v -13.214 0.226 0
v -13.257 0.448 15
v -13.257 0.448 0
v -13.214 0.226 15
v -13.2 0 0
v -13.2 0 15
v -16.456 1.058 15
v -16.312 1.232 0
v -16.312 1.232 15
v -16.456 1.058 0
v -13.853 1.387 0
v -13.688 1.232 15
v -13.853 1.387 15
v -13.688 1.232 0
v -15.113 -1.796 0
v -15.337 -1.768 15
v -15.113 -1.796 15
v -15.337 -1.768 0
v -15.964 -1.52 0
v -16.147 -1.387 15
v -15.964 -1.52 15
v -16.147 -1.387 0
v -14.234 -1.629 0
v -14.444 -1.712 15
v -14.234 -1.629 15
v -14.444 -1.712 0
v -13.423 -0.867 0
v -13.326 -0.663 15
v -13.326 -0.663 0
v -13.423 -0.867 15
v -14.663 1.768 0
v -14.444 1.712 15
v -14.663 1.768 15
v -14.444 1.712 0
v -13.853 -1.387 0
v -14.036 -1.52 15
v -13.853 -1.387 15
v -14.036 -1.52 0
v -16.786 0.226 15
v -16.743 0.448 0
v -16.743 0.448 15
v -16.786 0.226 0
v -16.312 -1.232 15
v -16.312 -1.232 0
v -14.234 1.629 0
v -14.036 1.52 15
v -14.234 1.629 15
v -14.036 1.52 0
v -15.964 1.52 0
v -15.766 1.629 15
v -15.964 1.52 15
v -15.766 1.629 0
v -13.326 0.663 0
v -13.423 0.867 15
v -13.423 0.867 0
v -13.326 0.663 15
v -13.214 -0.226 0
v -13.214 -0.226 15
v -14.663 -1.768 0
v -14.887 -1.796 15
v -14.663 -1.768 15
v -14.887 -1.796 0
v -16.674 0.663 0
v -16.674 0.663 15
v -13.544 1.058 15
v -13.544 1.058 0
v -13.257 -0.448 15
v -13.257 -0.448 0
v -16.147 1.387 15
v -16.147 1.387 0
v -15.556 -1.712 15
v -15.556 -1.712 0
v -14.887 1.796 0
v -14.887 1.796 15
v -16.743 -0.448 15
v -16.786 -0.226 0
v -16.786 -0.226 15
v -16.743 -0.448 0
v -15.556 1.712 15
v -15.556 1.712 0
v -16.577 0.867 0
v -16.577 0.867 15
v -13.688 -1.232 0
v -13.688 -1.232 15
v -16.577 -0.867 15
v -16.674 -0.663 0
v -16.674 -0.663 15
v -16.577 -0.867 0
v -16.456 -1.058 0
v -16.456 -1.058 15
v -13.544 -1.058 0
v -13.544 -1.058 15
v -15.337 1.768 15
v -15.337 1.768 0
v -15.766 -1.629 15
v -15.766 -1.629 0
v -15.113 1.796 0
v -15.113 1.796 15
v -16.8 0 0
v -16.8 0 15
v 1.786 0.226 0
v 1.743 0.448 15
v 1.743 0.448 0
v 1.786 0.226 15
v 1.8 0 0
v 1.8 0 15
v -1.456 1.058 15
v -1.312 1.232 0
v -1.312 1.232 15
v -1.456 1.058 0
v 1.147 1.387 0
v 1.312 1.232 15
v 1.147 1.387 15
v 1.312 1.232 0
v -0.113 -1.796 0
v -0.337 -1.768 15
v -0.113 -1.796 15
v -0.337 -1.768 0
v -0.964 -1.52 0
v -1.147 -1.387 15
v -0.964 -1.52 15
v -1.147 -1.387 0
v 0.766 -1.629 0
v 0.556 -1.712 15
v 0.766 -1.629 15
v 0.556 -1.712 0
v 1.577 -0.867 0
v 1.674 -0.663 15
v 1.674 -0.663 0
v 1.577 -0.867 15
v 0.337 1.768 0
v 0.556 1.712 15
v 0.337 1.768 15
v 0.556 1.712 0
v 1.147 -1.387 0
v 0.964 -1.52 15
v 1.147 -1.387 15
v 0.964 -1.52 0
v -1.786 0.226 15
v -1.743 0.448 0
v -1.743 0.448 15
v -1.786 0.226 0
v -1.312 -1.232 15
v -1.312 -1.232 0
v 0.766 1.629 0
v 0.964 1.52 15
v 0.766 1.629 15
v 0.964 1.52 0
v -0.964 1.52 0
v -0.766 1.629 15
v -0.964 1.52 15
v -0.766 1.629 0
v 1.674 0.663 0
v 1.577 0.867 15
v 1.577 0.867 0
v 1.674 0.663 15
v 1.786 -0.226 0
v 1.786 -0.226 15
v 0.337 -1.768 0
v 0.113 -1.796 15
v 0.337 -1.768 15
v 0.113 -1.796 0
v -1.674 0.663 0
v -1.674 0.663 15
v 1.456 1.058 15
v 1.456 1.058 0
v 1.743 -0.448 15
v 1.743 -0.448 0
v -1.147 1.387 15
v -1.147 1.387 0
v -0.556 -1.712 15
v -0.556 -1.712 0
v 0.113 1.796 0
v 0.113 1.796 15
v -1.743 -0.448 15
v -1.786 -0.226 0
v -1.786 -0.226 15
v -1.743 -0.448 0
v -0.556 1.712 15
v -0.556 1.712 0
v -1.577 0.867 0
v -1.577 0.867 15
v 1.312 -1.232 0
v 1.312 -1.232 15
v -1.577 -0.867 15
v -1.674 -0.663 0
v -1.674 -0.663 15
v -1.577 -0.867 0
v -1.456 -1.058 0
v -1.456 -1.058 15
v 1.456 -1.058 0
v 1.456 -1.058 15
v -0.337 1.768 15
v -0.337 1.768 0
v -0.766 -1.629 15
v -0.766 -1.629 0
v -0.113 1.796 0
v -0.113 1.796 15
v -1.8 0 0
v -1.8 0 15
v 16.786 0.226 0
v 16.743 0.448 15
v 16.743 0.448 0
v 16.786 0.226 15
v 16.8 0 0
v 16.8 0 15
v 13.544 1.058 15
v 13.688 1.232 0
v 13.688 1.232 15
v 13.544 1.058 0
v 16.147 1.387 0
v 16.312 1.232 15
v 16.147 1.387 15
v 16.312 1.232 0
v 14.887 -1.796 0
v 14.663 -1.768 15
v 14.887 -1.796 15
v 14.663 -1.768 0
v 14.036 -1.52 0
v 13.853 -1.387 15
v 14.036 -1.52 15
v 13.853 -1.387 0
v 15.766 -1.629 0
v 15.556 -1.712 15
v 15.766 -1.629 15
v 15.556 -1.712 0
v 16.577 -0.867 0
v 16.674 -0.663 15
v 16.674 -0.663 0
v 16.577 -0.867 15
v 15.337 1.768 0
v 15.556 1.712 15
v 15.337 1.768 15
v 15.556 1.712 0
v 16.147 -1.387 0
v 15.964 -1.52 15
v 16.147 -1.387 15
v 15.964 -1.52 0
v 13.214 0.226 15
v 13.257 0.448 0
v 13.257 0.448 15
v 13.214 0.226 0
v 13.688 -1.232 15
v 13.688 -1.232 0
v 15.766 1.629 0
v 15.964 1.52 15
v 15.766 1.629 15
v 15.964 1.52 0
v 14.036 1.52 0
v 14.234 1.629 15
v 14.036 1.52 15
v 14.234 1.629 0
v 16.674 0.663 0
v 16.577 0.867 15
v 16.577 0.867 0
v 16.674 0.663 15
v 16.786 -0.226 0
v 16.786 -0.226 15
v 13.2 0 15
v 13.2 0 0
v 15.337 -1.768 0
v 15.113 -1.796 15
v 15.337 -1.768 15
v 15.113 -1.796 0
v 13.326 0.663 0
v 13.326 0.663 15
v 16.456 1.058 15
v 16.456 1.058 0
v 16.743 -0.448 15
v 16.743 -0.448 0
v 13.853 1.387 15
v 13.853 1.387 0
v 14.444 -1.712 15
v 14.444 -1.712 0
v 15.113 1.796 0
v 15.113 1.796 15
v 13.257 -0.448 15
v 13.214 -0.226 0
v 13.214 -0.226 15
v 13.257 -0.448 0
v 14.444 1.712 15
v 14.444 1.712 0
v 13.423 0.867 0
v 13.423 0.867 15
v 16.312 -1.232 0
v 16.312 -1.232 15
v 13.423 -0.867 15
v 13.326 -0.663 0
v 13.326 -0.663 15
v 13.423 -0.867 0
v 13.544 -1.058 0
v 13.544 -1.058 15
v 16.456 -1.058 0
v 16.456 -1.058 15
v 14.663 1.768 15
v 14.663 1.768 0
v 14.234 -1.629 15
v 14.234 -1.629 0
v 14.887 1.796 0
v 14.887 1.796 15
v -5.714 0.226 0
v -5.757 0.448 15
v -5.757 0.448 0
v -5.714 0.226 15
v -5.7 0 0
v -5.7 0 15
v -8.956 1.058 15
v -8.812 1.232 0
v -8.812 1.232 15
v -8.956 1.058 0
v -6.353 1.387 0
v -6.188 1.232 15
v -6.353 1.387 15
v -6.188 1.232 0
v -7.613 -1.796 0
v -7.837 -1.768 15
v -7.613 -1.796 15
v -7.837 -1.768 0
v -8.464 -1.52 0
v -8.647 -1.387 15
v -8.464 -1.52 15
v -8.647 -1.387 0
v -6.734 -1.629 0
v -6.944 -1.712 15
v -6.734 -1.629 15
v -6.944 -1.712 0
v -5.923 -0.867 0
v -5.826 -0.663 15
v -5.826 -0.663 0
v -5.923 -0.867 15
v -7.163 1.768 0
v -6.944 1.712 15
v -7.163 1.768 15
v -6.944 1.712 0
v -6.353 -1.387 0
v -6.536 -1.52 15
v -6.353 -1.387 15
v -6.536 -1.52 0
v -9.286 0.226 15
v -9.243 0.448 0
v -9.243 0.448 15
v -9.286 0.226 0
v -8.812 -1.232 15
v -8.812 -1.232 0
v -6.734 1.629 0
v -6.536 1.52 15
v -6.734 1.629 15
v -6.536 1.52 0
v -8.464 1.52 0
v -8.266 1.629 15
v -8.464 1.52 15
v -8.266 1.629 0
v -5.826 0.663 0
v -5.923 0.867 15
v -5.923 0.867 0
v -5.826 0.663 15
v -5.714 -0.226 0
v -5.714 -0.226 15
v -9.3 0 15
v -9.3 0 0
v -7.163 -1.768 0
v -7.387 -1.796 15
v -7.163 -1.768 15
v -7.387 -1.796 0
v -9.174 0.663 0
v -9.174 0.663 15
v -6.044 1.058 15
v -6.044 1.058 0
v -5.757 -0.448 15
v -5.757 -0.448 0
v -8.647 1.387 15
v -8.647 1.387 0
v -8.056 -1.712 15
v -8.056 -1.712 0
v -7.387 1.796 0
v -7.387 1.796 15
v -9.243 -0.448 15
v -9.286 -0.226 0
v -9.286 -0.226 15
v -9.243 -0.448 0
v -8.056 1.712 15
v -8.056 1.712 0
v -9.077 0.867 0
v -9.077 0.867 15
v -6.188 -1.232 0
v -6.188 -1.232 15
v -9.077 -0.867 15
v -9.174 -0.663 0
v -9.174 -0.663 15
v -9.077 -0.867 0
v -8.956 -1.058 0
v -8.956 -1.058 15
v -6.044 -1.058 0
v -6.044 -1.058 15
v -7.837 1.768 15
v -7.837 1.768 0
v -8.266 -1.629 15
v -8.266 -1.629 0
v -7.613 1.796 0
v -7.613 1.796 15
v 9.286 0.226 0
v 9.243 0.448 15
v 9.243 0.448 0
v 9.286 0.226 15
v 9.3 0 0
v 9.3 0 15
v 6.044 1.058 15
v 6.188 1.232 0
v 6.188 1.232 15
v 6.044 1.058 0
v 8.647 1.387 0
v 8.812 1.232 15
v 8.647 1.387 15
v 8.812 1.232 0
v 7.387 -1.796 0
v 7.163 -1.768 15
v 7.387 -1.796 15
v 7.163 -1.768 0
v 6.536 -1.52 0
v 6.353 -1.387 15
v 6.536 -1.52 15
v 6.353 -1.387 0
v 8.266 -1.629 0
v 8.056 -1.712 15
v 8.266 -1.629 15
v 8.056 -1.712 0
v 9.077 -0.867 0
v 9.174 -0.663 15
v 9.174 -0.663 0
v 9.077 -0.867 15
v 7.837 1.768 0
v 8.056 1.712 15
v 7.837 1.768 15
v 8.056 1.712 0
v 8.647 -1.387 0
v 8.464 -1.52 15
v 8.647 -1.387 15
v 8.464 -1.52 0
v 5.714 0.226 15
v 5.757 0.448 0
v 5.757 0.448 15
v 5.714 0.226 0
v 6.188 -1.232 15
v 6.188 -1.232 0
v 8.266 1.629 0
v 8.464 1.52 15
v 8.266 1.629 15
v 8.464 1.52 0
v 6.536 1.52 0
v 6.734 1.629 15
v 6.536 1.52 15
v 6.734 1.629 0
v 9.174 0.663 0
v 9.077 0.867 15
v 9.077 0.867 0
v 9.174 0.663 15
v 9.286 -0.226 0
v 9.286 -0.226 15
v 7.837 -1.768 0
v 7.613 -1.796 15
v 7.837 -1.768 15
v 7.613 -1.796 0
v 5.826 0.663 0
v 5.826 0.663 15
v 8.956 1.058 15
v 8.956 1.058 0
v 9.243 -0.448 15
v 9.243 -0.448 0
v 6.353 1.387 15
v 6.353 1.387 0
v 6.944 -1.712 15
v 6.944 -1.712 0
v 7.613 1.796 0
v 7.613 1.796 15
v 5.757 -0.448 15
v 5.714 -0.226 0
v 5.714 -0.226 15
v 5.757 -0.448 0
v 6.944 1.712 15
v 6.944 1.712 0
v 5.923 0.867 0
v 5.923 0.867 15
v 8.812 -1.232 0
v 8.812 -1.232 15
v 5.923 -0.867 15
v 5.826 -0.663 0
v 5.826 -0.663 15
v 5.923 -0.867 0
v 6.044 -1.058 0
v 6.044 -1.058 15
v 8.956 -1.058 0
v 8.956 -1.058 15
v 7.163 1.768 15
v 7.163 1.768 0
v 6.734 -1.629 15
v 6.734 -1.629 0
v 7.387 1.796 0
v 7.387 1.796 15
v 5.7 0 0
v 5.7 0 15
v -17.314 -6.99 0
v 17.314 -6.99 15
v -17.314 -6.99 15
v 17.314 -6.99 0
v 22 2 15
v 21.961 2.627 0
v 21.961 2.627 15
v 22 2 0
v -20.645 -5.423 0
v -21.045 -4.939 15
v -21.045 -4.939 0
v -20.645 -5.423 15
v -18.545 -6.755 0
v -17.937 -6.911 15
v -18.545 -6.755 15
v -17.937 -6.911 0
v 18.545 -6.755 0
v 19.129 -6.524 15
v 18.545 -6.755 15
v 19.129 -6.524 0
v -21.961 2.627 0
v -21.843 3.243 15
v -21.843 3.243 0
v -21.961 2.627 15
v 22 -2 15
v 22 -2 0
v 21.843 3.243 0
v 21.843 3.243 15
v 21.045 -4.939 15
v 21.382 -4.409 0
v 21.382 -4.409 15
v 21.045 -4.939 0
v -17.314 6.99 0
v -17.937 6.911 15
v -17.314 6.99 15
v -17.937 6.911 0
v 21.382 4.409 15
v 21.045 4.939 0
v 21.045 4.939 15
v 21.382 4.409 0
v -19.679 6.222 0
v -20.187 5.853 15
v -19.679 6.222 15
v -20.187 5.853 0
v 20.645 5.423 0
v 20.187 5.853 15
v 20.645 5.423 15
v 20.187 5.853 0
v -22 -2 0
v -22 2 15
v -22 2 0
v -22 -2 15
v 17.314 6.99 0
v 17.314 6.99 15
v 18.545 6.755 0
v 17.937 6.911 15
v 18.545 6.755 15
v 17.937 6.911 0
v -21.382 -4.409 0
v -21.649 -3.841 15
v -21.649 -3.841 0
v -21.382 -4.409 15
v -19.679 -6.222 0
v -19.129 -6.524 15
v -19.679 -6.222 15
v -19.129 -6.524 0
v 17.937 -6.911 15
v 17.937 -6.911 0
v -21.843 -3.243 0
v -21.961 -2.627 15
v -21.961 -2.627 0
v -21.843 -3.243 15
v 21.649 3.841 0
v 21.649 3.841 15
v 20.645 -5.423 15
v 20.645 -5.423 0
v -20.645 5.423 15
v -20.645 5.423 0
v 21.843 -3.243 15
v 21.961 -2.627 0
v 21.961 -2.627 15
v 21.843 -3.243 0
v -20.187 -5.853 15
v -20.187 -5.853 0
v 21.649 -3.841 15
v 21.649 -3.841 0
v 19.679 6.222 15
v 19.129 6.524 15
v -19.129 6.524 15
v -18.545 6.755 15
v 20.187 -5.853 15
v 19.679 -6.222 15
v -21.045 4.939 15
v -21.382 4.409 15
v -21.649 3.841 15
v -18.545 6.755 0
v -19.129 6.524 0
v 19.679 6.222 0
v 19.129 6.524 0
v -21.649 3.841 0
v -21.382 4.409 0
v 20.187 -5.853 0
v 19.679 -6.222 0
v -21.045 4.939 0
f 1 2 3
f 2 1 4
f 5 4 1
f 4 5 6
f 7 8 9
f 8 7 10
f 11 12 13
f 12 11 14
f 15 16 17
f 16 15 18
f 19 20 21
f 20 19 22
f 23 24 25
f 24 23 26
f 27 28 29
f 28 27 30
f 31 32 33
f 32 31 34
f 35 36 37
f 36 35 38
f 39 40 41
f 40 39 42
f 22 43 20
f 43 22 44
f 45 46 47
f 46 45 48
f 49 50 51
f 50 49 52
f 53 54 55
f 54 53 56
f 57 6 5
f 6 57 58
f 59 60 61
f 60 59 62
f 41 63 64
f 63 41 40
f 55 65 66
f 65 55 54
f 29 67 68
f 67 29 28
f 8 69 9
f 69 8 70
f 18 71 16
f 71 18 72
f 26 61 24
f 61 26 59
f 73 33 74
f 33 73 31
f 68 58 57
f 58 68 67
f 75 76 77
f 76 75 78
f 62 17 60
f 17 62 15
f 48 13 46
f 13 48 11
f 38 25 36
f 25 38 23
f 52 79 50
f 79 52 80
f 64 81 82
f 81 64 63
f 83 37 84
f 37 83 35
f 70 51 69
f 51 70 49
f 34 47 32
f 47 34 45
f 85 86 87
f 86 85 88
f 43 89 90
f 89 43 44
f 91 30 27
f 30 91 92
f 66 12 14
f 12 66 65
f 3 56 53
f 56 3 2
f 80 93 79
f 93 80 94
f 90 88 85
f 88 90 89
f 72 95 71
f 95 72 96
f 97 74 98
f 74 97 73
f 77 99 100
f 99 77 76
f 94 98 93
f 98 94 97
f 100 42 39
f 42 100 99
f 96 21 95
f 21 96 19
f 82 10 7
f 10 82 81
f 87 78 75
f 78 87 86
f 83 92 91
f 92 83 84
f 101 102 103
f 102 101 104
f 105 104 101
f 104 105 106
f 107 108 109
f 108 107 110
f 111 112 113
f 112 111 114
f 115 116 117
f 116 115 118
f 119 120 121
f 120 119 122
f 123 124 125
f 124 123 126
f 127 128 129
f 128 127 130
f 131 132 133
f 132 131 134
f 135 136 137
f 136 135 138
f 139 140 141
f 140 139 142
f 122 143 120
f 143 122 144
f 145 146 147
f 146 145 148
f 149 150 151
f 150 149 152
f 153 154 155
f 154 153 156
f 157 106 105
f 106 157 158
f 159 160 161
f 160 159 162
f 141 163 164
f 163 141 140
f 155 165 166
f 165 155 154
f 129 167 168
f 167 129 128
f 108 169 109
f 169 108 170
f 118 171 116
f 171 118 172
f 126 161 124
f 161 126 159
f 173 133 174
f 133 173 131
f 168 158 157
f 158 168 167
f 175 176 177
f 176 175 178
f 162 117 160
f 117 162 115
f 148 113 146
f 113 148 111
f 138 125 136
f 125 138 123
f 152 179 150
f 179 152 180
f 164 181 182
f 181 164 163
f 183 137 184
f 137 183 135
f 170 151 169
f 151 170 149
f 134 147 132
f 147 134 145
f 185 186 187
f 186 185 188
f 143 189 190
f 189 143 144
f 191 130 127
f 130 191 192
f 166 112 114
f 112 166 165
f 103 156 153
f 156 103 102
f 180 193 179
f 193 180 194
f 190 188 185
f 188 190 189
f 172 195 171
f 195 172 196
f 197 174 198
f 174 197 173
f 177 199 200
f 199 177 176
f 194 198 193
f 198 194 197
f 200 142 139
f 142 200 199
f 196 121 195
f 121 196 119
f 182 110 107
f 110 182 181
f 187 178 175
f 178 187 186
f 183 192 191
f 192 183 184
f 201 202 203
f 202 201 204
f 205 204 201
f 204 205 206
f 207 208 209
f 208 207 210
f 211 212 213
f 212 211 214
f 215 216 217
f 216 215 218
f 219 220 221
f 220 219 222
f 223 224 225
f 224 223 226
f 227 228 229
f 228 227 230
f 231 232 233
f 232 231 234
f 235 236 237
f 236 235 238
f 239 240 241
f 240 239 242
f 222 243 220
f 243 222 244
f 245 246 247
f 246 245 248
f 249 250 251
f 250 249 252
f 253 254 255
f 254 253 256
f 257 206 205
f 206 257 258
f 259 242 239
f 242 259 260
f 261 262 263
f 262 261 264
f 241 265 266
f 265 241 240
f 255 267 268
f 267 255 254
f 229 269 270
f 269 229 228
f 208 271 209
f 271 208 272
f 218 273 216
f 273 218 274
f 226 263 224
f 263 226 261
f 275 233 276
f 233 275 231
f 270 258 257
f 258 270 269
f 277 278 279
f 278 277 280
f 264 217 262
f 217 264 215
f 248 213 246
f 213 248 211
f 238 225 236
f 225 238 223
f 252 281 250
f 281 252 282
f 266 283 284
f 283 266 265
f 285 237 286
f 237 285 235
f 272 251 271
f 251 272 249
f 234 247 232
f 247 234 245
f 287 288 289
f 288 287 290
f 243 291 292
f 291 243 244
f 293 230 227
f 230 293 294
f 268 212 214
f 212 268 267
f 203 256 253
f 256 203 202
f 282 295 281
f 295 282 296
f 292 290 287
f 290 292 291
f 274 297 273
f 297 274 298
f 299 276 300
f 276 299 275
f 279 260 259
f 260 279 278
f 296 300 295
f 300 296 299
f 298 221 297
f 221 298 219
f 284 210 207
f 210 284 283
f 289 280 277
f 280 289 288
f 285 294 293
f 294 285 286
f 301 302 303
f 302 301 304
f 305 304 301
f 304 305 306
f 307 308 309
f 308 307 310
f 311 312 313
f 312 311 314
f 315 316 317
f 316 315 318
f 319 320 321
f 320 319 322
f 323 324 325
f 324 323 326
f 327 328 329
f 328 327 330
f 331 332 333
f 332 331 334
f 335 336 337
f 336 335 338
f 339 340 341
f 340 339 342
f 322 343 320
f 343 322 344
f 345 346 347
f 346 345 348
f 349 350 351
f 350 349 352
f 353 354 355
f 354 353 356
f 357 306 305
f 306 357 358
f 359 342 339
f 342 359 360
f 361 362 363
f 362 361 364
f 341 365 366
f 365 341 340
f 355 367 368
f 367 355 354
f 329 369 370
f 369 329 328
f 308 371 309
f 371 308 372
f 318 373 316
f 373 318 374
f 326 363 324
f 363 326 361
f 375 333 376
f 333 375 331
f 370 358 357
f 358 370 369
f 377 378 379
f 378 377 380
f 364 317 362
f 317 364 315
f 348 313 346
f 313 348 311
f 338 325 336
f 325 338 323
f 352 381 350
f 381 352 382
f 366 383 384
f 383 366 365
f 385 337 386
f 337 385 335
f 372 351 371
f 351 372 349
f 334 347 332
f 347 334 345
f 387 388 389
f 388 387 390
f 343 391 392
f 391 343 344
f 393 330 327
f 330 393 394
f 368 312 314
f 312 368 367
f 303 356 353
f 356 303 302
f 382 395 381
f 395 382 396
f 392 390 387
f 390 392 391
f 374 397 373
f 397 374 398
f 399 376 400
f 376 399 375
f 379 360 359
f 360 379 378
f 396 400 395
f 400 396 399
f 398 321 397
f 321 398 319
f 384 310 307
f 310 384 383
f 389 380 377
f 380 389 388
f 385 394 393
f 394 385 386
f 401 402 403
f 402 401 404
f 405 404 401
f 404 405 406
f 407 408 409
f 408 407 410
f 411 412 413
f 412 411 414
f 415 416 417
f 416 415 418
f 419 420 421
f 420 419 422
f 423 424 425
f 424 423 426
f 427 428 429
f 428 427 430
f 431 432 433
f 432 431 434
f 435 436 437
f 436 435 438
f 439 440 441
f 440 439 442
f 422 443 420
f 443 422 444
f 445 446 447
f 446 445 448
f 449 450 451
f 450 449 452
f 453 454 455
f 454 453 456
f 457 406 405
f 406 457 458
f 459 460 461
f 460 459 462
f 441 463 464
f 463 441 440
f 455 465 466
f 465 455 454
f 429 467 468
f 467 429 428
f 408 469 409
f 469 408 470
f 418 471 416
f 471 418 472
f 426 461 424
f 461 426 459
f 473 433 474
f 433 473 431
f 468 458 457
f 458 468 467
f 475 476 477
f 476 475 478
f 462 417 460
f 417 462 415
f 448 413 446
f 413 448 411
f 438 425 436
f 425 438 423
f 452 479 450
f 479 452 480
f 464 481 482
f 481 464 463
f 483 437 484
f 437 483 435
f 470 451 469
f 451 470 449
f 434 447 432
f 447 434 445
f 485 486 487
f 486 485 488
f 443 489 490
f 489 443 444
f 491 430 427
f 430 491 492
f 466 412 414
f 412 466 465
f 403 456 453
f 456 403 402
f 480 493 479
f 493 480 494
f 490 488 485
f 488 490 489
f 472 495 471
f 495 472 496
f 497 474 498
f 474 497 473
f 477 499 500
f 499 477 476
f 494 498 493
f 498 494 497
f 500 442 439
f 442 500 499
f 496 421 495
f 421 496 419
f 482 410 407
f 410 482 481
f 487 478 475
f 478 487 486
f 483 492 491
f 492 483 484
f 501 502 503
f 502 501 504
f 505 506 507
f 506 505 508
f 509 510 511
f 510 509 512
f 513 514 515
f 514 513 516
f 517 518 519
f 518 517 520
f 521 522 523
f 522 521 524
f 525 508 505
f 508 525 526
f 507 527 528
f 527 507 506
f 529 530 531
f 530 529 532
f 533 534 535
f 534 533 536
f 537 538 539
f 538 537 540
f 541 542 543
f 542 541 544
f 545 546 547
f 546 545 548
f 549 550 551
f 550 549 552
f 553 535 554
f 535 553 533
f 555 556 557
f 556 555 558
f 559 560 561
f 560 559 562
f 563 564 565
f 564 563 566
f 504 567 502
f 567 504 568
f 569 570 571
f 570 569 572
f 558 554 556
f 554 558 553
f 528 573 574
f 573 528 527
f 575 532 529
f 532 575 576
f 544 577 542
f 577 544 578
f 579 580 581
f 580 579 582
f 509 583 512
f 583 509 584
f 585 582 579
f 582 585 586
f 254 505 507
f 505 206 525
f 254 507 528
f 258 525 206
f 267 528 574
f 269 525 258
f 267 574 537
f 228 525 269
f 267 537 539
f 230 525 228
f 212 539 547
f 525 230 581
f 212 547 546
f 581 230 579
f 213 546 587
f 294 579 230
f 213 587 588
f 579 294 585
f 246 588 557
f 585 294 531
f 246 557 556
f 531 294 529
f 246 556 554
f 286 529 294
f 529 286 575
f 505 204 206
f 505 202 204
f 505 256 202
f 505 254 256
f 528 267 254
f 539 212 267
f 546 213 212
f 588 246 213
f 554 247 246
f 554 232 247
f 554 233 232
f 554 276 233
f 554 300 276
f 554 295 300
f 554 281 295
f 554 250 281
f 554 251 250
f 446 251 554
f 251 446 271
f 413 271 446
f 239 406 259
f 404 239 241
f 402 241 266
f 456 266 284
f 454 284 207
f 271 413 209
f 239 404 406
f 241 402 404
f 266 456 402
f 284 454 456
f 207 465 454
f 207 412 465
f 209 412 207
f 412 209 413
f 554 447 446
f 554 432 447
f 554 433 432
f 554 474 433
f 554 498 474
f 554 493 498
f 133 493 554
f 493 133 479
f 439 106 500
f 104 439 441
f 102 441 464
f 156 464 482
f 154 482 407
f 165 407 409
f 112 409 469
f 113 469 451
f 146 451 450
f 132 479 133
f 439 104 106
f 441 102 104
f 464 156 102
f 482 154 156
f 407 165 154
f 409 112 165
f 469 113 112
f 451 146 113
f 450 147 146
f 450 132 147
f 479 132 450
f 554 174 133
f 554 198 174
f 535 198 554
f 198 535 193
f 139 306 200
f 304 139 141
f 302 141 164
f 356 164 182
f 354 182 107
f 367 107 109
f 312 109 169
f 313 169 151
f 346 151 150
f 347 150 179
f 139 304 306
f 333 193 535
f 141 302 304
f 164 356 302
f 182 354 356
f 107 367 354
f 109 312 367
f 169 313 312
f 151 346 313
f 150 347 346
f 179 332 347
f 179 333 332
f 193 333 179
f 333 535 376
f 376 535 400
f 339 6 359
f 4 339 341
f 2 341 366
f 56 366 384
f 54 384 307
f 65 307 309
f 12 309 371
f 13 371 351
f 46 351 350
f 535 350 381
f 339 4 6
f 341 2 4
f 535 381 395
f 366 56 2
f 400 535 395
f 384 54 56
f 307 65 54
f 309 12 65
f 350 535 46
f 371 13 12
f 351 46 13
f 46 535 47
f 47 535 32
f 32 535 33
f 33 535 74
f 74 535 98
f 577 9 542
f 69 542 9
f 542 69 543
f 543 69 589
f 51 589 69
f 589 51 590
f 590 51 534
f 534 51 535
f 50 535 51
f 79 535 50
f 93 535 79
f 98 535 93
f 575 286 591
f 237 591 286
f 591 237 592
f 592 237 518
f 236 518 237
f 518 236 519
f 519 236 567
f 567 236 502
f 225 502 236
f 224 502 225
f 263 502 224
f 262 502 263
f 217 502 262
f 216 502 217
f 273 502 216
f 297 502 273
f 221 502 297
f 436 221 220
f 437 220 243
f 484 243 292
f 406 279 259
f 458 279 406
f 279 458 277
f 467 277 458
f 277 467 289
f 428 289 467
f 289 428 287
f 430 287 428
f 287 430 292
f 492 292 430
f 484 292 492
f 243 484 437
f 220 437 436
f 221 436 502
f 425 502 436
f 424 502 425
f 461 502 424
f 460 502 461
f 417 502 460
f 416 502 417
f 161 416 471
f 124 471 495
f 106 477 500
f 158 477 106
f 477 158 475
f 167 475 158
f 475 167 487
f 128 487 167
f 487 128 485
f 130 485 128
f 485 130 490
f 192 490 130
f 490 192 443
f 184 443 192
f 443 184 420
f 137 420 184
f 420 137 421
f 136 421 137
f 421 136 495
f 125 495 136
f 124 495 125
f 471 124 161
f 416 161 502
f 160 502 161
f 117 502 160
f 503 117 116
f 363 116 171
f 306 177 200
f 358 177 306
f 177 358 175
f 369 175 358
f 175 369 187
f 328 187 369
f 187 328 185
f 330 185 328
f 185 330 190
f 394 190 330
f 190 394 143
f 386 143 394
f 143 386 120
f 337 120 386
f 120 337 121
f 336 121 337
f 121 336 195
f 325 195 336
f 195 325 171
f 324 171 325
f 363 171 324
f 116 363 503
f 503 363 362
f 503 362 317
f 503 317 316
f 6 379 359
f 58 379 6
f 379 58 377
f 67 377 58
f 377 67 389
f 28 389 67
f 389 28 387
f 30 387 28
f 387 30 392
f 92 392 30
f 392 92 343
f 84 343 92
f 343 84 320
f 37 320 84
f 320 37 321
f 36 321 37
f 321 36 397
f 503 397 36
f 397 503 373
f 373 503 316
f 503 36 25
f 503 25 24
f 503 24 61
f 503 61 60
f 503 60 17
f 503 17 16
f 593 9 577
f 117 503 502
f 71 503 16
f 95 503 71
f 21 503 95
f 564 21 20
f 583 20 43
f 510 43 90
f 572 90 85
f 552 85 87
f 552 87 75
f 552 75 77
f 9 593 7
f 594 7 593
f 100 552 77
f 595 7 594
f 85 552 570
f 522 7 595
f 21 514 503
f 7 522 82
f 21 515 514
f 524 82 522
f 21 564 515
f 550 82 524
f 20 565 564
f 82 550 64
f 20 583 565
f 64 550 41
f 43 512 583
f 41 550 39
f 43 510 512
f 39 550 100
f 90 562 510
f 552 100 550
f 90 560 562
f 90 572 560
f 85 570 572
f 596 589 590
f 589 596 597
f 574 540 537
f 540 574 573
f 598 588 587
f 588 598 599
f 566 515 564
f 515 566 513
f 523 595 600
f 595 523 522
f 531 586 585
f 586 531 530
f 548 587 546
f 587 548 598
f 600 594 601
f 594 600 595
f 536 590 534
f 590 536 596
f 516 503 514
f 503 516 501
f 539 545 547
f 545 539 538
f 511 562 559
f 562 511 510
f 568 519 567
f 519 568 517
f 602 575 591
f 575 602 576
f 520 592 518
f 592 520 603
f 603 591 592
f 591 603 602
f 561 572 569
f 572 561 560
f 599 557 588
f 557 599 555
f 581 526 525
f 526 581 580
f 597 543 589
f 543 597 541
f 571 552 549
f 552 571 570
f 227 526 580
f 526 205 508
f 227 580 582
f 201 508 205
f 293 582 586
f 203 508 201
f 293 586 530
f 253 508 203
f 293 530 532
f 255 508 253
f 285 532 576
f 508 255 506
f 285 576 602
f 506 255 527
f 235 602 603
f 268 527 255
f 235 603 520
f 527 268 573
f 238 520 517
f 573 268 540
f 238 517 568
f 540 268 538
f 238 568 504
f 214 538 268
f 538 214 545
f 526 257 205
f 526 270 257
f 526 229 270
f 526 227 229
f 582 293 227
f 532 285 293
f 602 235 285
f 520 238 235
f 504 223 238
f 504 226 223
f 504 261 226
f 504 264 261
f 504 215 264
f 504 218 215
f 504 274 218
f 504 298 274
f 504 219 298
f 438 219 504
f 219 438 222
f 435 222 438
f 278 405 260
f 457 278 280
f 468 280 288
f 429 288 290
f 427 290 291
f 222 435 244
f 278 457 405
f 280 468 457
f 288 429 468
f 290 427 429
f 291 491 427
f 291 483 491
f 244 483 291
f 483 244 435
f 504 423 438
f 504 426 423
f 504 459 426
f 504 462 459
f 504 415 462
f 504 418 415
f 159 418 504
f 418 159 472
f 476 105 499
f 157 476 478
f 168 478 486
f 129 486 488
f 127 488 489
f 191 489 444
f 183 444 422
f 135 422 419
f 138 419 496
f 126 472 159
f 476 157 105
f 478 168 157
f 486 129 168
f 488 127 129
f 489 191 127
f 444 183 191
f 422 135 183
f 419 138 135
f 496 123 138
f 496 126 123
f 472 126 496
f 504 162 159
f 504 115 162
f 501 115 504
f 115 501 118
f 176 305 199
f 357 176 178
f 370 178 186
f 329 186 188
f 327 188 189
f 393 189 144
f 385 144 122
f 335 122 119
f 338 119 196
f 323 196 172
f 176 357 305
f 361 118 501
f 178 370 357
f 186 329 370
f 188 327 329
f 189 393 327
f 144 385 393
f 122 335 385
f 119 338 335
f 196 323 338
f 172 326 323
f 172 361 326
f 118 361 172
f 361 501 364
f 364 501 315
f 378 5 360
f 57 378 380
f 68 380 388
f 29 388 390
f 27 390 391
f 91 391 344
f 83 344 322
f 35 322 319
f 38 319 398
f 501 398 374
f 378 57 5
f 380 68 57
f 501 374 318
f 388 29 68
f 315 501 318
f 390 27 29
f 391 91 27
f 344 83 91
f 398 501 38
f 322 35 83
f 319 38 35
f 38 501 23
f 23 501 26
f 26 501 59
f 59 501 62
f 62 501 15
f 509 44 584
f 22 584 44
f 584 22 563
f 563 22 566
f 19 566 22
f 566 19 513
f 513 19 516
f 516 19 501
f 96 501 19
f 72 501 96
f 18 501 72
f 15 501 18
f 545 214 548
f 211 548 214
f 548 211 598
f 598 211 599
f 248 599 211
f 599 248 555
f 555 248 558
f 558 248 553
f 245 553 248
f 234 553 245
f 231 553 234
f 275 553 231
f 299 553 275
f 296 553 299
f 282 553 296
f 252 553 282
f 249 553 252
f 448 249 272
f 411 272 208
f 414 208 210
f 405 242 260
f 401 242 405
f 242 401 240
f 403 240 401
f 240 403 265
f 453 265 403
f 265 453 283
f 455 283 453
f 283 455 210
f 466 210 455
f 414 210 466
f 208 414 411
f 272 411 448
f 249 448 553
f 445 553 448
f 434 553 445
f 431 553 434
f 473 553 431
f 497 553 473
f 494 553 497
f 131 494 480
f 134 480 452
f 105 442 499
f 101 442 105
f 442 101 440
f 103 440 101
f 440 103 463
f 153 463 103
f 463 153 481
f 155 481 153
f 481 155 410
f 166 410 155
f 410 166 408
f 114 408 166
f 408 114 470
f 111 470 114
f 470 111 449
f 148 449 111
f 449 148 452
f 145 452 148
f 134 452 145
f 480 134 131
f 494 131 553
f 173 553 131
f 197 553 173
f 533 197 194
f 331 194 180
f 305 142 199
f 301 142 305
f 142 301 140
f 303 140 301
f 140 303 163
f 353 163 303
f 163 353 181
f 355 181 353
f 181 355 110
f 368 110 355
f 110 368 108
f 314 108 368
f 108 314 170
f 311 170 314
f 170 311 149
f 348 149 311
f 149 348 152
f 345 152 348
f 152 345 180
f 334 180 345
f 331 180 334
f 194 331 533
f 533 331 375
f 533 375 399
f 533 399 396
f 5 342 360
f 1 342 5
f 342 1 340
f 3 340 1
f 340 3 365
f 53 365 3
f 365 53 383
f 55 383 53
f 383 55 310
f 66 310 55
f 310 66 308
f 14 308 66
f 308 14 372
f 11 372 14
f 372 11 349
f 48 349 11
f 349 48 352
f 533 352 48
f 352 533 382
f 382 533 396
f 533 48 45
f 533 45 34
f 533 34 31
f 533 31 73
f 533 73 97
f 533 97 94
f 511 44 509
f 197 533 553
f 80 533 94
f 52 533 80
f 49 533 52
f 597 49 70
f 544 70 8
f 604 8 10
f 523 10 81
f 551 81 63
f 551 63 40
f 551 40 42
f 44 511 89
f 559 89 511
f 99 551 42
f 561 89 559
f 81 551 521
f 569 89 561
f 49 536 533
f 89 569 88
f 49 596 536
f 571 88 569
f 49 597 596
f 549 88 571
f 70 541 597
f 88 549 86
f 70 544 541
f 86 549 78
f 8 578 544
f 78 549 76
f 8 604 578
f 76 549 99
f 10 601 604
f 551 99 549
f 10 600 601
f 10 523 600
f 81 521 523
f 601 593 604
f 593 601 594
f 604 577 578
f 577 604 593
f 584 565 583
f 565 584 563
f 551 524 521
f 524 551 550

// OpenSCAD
$fn = 50;


difference() {
	union() {
		hull() {
			translate(v = [-17.0000000000, 2.0000000000, 0]) {
				cylinder(h = 15, r = 5);
			}
			translate(v = [17.0000000000, 2.0000000000, 0]) {
				cylinder(h = 15, r = 5);
			}
			translate(v = [-17.0000000000, -2.0000000000, 0]) {
				cylinder(h = 15, r = 5);
			}
			translate(v = [17.0000000000, -2.0000000000, 0]) {
				cylinder(h = 15, r = 5);
			}
		}
	}
	union() {
		translate(v = [-15.0000000000, 0.0000000000, 0]) {
			translate(v = [0, 0, -100]) {
				cylinder(h = 200, r = 1.8000000000);
			}
		}
		translate(v = [0, 0, -100]) {
			cylinder(h = 200, r = 1.8000000000);
		}
		translate(v = [15.0000000000, 0.0000000000, 0]) {
			translate(v = [0, 0, -100]) {
				cylinder(h = 200, r = 1.8000000000);
			}
		}
		translate(v = [-15.0000000000, 0.0000000000, 0]) {
			translate(v = [0, 0, -100]) {
				cylinder(h = 200, r = 1.8000000000);
			}
		}
		translate(v = [-7.5000000000, 0.0000000000, 0]) {
			translate(v = [0, 0, -100]) {
				cylinder(h = 200, r = 1.8000000000);
			}
		}
		translate(v = [0, 0, -100]) {
			cylinder(h = 200, r = 1.8000000000);
		}
		translate(v = [7.5000000000, 0.0000000000, 0]) {
			translate(v = [0, 0, -100]) {
				cylinder(h = 200, r = 1.8000000000);
			}
		}
		translate(v = [15.0000000000, 0.0000000000, 0]) {
			translate(v = [0, 0, -100]) {
				cylinder(h = 200, r = 1.8000000000);
			}
		}
	}
}
